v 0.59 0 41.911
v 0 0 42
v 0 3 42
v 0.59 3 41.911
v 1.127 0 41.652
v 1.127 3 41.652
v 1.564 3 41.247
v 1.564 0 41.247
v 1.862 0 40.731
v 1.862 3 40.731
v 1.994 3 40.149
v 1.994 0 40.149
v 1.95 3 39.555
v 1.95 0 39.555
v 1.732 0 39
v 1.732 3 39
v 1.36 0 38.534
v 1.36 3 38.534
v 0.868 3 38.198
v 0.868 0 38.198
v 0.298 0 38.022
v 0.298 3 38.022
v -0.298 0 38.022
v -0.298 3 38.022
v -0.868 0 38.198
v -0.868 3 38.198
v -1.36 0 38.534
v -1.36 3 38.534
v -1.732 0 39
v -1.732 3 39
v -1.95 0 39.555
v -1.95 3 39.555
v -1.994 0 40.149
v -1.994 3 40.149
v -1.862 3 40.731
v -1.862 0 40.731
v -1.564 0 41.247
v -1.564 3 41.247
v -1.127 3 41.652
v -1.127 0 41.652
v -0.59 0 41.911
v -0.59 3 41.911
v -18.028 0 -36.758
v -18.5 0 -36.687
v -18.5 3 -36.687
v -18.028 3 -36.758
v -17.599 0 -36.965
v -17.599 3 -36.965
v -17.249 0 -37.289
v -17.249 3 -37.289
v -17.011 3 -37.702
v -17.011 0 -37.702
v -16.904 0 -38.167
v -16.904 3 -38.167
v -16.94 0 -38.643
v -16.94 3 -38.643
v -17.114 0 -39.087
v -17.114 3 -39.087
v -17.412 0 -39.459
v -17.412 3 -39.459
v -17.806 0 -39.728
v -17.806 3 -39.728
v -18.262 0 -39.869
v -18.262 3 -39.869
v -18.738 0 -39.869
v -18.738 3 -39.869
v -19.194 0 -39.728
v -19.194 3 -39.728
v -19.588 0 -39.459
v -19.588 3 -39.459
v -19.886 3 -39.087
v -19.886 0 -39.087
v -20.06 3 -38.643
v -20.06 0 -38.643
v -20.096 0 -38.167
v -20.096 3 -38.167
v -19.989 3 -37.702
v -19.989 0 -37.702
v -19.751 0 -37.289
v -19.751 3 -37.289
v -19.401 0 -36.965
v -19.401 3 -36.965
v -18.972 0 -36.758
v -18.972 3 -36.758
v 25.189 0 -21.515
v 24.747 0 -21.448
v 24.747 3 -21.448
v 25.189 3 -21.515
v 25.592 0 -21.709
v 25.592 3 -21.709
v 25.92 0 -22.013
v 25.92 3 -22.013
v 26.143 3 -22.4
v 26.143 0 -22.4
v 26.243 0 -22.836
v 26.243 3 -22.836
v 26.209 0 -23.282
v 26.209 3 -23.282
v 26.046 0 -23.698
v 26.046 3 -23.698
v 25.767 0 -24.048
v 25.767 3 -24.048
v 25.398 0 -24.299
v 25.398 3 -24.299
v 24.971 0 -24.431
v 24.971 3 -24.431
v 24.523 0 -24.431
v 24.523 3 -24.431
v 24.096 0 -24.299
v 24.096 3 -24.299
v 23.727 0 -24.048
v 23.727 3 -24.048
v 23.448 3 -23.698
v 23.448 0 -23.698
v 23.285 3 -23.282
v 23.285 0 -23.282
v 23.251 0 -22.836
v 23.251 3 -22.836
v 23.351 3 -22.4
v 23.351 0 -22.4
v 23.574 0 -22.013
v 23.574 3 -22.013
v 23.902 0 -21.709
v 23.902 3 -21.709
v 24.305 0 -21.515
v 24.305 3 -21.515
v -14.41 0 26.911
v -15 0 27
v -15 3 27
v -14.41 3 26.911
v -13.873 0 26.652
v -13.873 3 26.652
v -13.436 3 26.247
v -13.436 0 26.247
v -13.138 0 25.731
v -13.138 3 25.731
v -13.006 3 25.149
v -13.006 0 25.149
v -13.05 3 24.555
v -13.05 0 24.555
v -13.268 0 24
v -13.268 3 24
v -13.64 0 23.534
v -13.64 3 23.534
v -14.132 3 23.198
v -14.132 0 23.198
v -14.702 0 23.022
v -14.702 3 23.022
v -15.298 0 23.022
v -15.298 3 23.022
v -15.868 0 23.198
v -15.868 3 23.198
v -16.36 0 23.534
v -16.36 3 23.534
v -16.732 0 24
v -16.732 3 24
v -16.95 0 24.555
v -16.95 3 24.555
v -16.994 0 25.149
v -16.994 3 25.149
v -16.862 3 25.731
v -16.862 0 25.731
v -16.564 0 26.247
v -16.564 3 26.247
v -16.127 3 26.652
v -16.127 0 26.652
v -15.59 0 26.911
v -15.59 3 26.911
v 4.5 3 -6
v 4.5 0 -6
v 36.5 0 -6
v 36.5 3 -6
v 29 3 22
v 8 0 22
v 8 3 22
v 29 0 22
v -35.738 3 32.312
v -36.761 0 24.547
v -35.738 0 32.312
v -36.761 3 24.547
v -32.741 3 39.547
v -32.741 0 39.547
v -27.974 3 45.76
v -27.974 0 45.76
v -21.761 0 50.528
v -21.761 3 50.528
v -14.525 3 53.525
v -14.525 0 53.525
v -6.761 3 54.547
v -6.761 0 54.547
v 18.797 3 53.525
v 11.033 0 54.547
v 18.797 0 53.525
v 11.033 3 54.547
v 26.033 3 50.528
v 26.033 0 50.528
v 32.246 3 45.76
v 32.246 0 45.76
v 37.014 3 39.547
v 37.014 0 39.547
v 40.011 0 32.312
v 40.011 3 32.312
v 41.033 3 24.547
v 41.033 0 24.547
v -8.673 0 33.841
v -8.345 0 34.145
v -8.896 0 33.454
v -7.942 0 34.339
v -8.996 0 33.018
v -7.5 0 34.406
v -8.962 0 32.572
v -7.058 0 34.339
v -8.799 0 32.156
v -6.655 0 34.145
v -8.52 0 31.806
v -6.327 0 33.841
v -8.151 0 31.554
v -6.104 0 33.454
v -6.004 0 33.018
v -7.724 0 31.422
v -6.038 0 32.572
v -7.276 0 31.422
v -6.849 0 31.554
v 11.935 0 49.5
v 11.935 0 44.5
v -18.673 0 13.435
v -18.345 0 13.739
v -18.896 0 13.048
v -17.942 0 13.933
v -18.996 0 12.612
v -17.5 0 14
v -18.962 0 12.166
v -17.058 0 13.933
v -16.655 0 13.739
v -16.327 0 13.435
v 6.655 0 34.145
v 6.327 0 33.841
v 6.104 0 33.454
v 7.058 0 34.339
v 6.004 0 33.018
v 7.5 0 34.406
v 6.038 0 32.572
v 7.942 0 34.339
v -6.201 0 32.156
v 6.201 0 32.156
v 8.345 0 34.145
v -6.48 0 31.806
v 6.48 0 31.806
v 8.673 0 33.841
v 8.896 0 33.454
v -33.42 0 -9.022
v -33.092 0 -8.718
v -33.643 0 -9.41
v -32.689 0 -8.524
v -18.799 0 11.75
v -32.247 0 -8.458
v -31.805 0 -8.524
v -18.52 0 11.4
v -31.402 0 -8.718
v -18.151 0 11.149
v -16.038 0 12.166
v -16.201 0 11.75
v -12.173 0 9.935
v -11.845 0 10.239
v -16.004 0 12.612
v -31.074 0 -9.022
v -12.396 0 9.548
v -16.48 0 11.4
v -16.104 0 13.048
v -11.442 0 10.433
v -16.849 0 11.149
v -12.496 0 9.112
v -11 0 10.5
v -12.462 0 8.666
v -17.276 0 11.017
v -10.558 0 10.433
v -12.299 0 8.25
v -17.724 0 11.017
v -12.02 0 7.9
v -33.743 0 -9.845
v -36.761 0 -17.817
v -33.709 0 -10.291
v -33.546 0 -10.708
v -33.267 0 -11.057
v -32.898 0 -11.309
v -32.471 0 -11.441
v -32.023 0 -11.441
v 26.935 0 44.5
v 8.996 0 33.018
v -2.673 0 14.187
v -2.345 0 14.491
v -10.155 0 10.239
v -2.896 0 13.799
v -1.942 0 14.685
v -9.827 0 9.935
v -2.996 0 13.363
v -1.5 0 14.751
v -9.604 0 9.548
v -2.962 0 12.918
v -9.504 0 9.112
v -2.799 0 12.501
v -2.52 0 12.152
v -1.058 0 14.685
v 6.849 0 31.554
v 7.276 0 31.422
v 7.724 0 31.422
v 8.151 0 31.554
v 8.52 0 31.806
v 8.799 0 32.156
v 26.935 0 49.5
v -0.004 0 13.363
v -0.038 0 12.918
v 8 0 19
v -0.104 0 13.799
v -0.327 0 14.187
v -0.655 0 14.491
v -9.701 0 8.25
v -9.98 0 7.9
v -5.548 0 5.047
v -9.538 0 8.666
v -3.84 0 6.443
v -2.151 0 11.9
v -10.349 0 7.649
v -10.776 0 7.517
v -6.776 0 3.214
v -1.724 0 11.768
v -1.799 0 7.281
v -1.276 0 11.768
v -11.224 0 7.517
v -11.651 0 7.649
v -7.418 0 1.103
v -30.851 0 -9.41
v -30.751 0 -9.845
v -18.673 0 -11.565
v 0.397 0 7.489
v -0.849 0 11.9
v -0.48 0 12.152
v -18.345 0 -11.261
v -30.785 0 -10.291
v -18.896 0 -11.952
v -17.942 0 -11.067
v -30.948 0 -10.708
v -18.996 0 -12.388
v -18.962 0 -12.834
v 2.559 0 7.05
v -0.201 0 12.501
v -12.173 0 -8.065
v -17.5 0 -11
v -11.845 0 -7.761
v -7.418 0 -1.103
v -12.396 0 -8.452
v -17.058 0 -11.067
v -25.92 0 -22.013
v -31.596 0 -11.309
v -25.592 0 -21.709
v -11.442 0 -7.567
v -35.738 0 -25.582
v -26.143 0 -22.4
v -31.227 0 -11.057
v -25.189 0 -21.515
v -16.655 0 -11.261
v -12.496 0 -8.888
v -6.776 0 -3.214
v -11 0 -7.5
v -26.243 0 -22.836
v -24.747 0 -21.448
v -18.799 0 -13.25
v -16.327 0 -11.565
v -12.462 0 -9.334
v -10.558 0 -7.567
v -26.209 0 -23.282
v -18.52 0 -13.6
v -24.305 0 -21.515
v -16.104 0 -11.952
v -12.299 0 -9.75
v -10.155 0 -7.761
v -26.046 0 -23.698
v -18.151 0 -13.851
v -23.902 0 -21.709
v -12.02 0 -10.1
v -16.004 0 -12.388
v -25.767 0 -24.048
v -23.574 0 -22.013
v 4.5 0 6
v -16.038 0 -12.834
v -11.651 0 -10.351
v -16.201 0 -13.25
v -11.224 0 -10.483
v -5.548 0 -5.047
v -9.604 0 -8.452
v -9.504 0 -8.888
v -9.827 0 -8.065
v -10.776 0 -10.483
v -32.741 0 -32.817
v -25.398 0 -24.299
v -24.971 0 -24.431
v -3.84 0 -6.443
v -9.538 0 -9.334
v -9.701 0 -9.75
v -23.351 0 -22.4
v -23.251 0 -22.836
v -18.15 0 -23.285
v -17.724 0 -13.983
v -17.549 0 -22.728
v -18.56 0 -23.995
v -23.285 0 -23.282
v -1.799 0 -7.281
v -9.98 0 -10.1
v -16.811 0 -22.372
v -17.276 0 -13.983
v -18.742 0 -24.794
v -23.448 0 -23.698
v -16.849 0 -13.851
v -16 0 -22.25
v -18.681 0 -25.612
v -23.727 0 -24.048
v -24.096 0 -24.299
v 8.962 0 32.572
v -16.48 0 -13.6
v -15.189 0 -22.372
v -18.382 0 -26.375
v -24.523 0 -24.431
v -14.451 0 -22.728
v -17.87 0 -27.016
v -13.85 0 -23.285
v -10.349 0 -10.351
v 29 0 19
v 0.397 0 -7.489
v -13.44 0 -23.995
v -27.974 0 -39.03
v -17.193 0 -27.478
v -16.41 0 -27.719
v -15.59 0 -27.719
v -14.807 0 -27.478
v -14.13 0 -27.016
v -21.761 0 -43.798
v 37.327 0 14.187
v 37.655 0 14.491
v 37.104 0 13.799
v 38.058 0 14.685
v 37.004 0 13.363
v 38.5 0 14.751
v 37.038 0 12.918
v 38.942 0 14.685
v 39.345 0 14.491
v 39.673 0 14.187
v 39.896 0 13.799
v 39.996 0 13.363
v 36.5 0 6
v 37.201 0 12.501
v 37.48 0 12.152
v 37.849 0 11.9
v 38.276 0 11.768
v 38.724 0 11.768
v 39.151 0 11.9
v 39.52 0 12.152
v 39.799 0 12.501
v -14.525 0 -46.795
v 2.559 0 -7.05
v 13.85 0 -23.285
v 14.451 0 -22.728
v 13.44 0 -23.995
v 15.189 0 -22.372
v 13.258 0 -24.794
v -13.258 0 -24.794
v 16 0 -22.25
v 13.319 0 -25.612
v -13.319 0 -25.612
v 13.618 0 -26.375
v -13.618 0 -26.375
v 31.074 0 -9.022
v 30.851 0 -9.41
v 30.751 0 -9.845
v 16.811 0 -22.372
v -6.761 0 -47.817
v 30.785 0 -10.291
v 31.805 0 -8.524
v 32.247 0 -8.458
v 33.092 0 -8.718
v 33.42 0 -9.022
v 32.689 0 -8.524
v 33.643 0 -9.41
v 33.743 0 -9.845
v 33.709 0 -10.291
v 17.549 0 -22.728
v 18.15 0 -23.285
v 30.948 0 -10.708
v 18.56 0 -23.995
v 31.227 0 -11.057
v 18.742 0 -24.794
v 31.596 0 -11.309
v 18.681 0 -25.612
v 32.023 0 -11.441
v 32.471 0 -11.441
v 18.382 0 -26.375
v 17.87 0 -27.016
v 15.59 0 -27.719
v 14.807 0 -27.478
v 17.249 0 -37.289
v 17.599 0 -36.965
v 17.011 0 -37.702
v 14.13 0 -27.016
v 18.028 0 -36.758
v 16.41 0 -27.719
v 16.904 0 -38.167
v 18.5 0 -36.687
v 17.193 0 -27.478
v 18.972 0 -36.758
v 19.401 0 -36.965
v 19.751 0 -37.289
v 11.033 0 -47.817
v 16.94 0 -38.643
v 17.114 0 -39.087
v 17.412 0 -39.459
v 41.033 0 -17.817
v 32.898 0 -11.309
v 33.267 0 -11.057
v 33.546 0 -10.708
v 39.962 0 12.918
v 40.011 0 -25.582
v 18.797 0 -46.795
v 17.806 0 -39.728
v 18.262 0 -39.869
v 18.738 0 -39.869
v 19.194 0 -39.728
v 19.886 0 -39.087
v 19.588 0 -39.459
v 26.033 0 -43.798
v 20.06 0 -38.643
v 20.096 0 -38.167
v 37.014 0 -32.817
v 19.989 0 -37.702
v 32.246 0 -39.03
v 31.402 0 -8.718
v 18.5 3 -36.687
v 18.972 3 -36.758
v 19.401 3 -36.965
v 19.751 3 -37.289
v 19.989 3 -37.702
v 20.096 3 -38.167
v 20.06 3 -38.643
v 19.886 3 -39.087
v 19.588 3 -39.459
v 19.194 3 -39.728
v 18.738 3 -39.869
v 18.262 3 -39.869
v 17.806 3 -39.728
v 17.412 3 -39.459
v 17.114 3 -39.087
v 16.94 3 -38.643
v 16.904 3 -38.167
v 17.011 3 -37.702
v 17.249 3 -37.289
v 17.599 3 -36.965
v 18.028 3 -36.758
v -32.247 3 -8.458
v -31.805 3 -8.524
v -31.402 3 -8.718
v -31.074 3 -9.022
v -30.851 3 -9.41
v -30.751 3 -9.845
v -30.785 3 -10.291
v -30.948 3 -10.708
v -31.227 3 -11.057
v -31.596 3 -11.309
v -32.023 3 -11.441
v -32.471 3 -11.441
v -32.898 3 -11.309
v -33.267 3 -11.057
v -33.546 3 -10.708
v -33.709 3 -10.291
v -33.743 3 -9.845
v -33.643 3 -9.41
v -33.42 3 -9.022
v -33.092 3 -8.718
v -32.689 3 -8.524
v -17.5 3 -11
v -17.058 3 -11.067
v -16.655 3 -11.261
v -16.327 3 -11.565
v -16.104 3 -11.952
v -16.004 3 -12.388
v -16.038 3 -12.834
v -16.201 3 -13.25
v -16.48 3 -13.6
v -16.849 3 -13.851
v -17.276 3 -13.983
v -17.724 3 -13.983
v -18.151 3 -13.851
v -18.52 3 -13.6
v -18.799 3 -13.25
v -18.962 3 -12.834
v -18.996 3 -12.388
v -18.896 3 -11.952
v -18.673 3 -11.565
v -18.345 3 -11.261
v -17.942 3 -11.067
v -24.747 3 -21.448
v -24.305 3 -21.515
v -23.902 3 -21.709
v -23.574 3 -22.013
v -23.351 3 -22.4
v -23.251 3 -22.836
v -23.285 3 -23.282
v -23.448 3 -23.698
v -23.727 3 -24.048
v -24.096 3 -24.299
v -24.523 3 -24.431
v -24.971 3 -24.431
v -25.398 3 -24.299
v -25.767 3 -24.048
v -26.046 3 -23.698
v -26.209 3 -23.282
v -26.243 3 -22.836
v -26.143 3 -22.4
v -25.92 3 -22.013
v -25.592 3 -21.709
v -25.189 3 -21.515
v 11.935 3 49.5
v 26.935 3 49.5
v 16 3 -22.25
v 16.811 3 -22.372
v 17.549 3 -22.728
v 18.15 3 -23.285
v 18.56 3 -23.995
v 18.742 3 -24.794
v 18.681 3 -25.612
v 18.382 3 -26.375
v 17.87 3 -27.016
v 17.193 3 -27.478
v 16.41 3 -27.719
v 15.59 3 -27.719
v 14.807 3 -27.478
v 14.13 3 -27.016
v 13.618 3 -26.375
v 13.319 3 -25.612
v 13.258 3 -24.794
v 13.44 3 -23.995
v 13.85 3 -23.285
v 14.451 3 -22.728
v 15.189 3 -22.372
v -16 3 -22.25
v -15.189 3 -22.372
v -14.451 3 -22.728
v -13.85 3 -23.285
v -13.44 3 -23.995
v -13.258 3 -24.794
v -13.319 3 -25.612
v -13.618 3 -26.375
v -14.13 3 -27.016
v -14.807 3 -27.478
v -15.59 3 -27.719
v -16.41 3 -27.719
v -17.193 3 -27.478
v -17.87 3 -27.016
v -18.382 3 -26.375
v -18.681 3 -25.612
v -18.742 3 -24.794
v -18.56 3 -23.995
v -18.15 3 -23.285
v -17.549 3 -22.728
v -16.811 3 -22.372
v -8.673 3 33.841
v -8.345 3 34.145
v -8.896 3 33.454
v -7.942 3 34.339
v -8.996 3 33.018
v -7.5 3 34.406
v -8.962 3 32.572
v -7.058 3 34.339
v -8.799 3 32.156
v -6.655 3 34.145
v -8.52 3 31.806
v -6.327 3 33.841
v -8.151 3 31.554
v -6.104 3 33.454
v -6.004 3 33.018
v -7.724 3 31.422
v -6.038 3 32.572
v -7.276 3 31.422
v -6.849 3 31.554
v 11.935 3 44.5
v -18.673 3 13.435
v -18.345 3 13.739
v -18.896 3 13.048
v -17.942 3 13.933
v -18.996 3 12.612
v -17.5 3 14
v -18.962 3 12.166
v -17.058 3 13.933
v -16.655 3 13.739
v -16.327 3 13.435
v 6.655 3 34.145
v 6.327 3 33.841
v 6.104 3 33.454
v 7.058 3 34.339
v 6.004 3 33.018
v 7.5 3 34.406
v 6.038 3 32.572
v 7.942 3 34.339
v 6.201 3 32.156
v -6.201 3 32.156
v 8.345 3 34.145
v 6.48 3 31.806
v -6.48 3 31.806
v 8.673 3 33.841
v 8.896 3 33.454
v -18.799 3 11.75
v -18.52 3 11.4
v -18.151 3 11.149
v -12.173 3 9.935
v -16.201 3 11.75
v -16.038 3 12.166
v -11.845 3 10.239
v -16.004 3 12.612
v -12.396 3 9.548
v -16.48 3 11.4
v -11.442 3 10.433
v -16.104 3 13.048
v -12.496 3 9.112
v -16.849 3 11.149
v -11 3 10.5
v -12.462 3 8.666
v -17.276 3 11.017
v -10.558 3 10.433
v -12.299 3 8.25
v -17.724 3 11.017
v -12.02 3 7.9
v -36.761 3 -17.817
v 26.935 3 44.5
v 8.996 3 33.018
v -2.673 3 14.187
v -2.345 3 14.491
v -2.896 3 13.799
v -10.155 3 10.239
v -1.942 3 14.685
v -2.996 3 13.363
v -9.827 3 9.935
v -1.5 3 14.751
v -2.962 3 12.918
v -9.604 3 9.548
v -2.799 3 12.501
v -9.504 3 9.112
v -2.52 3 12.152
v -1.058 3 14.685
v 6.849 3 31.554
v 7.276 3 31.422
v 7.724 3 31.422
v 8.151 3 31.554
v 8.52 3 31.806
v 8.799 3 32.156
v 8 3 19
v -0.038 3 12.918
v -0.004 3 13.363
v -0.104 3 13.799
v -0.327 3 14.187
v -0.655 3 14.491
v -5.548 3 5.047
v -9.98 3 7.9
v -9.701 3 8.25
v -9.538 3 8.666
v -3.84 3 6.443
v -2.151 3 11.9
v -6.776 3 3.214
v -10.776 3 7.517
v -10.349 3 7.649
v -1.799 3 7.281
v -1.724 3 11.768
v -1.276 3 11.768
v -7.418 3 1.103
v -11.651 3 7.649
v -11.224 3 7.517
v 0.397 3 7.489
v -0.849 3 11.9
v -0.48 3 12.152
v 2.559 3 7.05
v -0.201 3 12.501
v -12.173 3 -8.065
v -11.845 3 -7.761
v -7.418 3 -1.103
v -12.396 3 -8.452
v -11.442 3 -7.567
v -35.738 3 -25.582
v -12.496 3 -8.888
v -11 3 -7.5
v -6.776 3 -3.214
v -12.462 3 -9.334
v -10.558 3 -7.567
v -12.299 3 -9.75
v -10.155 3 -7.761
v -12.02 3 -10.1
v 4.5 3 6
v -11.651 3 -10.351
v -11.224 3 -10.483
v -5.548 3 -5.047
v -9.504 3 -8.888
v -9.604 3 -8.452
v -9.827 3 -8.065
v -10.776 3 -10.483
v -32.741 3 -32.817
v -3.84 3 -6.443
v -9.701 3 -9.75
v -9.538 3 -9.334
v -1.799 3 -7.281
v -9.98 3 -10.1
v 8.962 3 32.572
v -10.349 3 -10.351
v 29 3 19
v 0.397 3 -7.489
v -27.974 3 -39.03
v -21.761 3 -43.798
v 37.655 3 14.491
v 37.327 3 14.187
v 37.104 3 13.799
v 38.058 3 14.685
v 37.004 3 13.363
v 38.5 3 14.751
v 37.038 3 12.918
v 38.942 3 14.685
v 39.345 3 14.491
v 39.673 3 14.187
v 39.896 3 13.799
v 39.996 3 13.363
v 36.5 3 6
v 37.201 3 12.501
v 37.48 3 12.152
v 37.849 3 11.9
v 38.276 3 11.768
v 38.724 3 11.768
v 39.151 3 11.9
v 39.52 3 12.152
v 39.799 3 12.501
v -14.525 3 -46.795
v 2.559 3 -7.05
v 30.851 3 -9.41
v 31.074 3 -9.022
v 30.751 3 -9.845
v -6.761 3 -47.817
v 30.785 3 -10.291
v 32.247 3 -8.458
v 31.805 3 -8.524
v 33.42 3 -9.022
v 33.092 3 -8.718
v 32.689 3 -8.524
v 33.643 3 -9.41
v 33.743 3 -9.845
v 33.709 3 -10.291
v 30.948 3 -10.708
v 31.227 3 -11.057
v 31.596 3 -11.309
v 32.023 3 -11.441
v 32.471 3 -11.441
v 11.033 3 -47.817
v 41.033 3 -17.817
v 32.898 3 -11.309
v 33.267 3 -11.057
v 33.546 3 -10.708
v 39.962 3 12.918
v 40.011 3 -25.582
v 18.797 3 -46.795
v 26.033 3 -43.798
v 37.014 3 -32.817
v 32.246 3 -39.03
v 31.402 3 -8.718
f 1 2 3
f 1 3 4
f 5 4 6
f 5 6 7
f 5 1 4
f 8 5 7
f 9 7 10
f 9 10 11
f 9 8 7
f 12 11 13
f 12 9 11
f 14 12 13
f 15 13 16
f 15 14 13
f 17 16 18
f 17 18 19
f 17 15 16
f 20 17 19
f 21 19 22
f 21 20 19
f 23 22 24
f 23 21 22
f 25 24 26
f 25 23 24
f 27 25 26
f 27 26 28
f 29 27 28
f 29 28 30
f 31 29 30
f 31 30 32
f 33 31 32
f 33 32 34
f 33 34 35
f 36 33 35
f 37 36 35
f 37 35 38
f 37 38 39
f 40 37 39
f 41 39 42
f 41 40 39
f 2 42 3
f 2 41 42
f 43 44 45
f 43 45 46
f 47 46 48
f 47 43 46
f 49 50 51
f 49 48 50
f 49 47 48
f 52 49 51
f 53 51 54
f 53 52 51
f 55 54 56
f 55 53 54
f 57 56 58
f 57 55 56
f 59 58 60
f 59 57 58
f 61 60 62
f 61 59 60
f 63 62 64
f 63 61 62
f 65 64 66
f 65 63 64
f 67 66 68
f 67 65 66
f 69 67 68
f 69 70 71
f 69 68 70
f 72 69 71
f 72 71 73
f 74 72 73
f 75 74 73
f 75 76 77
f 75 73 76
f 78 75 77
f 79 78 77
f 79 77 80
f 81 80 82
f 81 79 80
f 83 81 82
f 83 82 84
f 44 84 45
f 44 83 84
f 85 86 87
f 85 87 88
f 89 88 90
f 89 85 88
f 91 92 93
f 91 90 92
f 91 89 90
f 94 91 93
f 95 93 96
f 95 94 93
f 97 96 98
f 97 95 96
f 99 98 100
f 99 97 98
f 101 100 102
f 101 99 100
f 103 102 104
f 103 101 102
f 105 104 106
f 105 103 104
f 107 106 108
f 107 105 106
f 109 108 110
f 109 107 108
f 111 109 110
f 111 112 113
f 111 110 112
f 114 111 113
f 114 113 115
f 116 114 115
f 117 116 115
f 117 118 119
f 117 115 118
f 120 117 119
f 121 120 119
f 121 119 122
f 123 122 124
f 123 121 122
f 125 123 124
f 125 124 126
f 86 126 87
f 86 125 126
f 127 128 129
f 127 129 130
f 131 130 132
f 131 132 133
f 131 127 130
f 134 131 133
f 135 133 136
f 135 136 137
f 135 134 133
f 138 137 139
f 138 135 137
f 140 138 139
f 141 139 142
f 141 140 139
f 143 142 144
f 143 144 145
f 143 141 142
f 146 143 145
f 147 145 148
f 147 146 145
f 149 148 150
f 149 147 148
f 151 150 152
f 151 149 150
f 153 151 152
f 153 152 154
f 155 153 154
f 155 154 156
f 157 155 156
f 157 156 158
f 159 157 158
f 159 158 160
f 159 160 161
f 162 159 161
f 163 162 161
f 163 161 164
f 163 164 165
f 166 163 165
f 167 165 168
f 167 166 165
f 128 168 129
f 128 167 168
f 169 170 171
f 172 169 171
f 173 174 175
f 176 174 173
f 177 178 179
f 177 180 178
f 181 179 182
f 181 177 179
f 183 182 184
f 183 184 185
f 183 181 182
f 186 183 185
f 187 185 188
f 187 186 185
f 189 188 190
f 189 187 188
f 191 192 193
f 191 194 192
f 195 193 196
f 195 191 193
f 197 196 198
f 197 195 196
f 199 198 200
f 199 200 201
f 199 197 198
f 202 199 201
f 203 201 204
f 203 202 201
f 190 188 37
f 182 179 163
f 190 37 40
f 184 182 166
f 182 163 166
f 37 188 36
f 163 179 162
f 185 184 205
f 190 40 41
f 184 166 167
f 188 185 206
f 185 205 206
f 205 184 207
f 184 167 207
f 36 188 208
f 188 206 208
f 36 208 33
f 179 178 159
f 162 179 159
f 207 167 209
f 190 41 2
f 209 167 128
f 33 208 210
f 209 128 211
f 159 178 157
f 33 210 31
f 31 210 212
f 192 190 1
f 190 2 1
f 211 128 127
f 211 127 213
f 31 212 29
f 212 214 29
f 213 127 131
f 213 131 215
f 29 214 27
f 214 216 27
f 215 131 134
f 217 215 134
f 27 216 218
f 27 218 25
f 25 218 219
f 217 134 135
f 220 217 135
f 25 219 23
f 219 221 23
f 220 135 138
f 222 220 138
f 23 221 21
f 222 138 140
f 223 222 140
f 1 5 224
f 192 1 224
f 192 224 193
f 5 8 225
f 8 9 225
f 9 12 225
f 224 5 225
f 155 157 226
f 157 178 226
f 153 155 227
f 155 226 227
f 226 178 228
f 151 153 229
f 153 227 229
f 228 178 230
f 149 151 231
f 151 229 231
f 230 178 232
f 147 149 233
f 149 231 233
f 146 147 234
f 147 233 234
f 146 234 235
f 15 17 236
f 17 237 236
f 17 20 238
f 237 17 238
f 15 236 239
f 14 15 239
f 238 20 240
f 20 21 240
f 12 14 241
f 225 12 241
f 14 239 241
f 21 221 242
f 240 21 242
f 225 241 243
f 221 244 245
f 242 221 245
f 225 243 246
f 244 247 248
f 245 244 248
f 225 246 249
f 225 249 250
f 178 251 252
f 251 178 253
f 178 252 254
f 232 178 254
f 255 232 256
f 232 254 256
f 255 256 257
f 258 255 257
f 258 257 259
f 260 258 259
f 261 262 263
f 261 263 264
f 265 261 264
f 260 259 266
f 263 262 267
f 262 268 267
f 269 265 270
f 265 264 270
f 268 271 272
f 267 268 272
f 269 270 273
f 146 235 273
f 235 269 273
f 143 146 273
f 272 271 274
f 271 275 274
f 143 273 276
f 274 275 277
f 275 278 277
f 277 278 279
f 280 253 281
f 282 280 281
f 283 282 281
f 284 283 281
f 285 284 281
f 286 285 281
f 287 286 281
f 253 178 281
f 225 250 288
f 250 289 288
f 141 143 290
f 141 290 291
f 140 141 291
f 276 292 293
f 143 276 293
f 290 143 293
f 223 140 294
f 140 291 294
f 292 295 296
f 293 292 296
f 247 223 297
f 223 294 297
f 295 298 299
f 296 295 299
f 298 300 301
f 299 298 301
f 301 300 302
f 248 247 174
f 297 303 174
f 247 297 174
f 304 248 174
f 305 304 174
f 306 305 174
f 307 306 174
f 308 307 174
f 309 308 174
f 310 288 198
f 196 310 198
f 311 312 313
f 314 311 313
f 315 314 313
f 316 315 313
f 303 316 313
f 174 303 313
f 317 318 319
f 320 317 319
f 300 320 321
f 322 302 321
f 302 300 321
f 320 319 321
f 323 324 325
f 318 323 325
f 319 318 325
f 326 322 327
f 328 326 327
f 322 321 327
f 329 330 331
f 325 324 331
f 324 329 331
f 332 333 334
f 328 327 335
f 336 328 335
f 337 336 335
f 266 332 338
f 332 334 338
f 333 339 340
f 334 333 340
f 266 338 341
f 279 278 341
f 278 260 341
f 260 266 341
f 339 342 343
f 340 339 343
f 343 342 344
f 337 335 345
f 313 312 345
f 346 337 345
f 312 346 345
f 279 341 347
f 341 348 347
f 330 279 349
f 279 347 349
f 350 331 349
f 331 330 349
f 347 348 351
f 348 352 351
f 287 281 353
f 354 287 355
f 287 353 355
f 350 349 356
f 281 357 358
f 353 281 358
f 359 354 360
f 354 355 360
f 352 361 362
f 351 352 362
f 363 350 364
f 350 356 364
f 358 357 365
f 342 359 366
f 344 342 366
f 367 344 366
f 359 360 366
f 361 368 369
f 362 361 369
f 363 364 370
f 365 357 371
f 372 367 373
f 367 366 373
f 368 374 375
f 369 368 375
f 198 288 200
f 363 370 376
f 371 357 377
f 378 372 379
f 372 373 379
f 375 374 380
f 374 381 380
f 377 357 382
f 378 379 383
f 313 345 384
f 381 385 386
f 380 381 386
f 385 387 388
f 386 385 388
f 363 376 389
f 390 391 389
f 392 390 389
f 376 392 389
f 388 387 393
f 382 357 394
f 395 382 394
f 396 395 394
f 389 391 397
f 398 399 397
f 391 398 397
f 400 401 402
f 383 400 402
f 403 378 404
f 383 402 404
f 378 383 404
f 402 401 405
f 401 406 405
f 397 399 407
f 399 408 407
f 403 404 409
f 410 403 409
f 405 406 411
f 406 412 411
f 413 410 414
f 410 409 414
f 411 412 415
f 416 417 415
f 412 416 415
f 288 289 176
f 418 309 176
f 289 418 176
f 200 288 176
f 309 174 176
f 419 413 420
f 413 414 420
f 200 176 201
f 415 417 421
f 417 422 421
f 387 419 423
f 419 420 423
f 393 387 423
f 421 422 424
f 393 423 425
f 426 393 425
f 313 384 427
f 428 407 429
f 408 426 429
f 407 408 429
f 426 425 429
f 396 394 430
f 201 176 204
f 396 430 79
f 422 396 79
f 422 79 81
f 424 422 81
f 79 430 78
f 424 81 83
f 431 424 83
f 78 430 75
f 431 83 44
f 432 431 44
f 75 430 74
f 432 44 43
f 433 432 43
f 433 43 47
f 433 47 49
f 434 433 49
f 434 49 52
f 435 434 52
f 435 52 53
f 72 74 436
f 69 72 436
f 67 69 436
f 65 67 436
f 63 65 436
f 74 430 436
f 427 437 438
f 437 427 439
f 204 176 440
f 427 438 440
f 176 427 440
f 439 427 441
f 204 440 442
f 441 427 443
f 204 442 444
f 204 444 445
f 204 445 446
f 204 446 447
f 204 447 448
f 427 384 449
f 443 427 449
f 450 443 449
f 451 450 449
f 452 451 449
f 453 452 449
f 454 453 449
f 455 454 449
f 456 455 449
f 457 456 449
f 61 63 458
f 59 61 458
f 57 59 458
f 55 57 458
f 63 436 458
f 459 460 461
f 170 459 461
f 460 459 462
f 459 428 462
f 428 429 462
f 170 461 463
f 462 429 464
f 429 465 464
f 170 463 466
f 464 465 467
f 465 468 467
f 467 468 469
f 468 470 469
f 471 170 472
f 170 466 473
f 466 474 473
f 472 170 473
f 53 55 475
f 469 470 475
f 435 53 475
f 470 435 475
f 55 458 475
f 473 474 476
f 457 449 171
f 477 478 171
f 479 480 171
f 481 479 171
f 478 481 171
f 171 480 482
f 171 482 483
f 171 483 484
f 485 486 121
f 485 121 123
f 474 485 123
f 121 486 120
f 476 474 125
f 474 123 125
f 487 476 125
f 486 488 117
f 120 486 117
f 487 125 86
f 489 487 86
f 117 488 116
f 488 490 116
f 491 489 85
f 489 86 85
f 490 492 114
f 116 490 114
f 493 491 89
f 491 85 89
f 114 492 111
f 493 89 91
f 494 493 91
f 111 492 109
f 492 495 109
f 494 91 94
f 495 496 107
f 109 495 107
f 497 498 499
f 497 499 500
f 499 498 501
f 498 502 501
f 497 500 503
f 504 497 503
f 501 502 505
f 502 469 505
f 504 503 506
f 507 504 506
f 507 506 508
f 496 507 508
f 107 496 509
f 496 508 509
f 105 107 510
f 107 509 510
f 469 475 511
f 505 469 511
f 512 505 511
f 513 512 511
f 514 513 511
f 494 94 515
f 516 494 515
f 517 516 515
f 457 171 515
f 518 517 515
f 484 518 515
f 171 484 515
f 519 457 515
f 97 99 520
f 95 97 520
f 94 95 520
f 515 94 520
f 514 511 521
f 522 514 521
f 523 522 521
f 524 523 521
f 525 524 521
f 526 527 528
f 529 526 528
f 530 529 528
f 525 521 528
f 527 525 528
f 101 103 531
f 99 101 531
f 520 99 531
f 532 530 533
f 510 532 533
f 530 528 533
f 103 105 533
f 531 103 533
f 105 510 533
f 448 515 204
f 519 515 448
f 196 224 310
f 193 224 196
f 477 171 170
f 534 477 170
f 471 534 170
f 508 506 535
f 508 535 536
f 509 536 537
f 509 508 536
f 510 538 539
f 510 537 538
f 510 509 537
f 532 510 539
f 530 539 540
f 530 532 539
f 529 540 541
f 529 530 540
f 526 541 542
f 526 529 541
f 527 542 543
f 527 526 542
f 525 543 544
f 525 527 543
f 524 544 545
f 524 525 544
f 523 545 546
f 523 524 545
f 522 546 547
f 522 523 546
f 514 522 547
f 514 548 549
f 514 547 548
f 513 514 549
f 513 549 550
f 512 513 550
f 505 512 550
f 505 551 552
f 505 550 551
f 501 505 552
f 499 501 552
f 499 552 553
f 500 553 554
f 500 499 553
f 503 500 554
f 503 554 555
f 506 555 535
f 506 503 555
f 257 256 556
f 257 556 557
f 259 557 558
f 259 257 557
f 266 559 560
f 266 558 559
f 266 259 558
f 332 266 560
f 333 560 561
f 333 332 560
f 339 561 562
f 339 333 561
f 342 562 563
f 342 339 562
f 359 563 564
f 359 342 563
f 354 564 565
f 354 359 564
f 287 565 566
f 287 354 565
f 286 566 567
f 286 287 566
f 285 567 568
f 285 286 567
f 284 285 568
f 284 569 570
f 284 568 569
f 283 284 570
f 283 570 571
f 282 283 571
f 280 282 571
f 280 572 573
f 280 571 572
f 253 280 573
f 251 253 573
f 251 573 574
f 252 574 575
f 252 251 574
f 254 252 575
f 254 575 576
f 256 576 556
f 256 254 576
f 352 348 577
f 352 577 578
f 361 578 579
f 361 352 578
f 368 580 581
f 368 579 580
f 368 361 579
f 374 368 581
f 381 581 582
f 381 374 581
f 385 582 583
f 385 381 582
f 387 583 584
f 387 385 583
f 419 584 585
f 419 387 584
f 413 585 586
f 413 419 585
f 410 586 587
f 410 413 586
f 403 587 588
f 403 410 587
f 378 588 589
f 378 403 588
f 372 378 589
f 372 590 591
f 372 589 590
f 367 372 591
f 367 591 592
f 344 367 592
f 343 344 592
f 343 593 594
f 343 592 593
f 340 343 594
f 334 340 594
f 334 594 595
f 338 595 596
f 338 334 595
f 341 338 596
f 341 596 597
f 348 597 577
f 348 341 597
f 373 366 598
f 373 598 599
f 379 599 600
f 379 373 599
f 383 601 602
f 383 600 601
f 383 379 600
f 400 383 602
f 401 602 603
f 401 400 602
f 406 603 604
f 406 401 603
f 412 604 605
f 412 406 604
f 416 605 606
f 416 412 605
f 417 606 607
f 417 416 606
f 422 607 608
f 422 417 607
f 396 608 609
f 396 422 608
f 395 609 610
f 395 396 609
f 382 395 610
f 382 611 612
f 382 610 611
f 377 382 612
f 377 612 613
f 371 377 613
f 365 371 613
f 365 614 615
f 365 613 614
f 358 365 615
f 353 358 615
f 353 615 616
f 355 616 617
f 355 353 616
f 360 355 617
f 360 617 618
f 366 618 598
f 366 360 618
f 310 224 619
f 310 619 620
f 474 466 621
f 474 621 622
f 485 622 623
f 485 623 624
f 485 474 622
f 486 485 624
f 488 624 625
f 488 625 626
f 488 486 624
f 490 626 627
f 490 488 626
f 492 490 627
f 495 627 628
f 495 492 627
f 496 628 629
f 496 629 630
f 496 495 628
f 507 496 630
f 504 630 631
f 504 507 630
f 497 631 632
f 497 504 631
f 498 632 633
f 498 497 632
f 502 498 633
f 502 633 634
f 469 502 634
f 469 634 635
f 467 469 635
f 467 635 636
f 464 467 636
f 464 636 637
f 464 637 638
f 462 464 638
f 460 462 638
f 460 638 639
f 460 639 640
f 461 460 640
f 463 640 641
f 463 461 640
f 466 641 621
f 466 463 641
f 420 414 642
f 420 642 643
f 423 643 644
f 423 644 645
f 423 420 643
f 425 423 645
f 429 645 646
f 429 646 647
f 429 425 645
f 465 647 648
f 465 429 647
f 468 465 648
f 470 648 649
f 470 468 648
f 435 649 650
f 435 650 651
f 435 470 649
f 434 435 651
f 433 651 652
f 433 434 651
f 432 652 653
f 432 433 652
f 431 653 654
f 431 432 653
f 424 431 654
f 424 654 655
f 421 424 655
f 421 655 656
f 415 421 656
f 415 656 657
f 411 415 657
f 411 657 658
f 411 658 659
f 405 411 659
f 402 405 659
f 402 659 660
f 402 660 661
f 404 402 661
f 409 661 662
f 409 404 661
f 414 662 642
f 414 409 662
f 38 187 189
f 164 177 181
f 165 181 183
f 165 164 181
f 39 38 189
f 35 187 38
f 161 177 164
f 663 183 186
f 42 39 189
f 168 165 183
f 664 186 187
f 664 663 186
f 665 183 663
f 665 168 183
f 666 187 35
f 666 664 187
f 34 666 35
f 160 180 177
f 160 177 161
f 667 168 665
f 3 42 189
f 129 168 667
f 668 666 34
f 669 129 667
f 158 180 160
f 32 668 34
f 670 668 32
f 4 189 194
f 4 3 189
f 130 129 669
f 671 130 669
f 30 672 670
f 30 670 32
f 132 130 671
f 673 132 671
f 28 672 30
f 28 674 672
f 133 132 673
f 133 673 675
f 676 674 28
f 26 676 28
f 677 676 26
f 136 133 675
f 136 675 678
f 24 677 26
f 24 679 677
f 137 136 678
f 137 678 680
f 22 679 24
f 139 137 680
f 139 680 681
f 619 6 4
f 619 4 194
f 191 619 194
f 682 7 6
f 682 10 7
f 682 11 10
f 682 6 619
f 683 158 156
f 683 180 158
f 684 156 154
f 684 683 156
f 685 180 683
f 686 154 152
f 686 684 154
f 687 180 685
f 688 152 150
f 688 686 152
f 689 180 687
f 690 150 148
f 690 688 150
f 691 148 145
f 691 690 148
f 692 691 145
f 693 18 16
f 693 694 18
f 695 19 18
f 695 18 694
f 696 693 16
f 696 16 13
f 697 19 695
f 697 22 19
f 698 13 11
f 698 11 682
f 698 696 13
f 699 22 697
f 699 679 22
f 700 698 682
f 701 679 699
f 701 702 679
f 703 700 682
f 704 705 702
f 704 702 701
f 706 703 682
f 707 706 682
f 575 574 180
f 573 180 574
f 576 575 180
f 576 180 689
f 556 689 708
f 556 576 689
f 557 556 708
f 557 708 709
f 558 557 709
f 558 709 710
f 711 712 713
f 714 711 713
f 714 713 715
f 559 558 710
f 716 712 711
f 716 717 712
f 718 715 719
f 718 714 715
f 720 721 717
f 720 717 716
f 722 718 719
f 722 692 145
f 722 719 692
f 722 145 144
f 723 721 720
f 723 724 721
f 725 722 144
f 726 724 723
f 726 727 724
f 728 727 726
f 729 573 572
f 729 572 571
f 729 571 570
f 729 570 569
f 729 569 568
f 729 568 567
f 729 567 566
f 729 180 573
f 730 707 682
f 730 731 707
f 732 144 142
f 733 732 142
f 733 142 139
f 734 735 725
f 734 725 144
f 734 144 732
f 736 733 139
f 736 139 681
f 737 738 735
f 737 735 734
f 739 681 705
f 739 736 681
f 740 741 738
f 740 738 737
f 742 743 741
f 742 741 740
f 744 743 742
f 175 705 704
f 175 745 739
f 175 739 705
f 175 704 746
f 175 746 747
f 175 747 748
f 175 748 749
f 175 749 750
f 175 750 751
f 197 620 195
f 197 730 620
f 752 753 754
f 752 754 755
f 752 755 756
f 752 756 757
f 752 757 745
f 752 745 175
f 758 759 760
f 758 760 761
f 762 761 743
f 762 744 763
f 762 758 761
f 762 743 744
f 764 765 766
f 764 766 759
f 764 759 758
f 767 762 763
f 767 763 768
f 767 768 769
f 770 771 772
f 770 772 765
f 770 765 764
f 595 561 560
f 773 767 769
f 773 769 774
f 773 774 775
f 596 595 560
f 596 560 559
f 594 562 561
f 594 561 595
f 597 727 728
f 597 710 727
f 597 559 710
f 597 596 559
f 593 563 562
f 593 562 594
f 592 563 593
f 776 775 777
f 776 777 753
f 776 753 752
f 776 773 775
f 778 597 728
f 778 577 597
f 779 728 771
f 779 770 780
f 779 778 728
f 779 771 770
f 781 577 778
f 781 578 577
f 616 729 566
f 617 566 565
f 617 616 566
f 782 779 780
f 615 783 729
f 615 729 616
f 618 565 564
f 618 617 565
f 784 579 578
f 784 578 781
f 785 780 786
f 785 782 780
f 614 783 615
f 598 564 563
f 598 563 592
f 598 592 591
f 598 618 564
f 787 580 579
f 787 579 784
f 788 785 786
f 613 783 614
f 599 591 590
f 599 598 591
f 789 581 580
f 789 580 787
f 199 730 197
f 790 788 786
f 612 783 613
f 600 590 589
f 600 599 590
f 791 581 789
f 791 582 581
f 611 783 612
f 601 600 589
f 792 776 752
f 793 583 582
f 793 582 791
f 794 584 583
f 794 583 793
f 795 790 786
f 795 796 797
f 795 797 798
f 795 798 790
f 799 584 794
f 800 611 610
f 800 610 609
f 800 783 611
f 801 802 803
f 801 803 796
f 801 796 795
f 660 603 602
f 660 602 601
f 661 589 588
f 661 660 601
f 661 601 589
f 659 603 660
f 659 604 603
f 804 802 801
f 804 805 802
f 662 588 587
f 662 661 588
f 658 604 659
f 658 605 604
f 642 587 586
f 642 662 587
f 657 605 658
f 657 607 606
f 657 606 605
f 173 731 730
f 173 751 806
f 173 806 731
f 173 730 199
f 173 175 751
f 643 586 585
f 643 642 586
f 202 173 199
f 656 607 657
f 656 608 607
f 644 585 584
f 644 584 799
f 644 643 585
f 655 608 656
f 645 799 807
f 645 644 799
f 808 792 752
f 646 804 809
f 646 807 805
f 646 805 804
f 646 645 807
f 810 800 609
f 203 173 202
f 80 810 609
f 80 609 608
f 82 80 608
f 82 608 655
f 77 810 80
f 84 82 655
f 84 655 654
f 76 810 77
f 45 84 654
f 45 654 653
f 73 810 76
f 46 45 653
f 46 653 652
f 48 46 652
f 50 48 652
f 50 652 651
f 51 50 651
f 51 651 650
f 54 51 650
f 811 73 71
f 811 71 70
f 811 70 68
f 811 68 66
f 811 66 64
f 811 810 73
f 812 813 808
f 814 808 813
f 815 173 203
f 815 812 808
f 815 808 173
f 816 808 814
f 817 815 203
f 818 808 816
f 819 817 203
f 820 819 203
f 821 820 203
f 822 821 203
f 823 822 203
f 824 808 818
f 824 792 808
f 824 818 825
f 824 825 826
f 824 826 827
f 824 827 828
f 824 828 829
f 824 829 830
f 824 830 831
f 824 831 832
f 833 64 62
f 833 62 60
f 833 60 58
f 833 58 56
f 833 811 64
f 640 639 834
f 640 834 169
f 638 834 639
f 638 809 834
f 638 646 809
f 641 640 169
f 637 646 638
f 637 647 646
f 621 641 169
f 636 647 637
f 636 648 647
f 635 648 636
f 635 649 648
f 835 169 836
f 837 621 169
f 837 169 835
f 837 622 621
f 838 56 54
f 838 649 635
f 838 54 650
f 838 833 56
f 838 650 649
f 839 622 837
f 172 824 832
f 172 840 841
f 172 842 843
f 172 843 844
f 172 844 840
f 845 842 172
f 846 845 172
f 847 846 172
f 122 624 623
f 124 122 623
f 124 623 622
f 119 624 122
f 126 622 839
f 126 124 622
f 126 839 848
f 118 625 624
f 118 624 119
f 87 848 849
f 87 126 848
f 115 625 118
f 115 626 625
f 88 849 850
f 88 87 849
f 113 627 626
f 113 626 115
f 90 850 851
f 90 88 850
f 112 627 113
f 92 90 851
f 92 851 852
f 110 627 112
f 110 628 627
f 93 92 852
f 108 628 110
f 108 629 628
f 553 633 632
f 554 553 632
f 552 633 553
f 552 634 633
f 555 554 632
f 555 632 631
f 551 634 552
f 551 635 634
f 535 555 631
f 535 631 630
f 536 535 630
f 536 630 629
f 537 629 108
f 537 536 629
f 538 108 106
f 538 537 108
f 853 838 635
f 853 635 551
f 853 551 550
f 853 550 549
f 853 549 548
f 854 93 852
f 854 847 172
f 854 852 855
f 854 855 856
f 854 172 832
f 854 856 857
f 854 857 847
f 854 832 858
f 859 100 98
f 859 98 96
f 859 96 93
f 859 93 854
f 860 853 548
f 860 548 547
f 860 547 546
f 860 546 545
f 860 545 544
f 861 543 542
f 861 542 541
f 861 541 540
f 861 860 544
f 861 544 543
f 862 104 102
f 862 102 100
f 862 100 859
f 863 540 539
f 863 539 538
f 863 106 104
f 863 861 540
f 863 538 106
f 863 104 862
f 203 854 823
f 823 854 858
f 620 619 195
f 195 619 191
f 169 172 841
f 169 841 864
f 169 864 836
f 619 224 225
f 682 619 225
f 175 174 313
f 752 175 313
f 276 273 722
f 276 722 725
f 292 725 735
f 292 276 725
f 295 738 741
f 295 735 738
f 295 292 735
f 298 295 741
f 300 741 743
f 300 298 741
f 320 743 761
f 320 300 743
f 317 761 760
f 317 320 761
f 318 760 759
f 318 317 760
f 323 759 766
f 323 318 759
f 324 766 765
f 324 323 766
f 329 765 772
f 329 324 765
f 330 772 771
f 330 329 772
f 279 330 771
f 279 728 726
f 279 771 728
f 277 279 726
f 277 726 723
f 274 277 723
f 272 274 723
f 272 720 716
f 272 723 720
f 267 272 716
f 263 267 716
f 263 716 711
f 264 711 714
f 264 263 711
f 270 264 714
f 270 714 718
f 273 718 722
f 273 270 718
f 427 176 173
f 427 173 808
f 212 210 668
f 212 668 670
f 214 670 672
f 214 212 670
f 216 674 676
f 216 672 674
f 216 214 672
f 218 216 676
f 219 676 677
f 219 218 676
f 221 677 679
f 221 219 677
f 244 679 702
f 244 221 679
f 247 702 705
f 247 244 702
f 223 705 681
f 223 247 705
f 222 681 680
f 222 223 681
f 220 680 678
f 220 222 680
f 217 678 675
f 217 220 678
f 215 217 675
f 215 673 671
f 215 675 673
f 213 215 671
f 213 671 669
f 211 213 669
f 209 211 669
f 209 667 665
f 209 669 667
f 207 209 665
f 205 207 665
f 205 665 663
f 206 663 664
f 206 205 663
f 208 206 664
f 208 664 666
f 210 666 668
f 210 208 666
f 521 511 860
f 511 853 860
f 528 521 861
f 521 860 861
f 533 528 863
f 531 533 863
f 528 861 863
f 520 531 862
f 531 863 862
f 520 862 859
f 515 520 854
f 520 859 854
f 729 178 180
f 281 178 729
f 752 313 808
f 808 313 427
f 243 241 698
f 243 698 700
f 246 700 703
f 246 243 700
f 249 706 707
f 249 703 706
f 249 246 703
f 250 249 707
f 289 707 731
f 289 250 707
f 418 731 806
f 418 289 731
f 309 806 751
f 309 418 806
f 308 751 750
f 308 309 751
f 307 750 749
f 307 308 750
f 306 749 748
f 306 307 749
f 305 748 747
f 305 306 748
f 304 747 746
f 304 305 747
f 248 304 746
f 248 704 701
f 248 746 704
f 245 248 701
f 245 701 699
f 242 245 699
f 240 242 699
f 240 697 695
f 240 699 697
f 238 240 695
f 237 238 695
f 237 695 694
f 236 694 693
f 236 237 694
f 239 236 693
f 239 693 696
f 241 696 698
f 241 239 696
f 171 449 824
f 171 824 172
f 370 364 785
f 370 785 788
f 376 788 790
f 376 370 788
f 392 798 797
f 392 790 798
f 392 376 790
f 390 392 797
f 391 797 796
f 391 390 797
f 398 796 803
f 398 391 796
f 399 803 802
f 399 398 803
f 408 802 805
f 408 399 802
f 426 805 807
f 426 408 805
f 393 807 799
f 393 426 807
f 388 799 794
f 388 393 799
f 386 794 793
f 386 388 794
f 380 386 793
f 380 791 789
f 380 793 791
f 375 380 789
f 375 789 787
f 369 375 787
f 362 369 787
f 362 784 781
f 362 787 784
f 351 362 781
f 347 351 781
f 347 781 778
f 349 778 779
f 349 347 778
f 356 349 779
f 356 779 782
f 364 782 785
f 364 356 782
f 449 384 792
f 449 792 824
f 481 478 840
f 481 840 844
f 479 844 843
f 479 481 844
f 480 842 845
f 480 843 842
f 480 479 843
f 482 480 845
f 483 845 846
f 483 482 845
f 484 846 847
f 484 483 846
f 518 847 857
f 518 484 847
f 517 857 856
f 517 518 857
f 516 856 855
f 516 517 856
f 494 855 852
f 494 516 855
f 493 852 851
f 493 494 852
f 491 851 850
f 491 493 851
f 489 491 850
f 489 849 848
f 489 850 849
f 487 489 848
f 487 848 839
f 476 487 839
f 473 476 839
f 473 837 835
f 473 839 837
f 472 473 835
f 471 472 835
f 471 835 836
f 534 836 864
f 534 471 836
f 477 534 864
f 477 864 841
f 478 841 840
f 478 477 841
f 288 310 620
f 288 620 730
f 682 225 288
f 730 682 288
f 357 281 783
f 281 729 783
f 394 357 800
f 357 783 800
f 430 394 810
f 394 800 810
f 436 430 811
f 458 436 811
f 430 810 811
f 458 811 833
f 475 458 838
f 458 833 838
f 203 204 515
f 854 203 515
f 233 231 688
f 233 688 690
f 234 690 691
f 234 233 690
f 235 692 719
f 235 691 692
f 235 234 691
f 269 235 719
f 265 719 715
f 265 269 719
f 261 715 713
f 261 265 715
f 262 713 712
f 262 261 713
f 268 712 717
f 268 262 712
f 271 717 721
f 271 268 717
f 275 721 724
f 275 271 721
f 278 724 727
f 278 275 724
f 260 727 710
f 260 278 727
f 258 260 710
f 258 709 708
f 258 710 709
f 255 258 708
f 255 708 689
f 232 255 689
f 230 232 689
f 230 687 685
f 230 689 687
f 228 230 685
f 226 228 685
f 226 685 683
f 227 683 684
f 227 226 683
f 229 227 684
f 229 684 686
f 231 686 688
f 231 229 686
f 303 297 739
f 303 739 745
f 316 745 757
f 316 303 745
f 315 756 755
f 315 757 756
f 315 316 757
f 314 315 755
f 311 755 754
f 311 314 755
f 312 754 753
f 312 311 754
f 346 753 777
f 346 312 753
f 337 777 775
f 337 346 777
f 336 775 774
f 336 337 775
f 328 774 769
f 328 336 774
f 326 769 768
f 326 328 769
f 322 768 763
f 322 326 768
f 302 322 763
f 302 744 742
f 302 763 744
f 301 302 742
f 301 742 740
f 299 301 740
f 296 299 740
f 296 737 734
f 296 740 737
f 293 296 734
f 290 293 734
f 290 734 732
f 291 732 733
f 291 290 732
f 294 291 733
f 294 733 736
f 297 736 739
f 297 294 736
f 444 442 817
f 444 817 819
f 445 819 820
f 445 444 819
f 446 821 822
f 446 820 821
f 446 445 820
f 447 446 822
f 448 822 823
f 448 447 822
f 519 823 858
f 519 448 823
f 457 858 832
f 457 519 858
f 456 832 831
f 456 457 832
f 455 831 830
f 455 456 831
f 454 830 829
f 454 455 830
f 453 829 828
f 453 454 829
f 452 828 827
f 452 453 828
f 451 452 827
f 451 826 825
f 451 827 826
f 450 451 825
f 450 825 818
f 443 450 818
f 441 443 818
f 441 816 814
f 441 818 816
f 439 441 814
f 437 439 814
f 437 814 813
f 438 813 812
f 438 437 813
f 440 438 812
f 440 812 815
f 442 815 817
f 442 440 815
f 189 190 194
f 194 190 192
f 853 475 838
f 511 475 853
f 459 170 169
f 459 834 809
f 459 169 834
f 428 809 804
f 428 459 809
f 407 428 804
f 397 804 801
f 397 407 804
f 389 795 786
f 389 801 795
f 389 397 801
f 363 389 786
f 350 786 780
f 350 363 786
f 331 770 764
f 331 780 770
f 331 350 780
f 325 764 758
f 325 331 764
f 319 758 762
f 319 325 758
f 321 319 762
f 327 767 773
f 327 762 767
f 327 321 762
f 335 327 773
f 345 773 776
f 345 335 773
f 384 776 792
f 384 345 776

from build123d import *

# Parameters (mm, degrees)
SKETCH1_W               = 77.793311879
SKETCH1_H               = 102.364407774
SKETCH1_R               = 2.75
SKETCH1_R_2             = 2
SKETCH1_R_3             = 7.5
BOSS_EXTRUDE1_DEPTH     = 3
CUT_EXTRUDE1_DEPTH      = 69.323346558
CUT_EXTRUDE1_DEPTH_BACK = 69.323346558
SKETCH2_R               = 1.5
CUT_EXTRUDE2_DEPTH      = 69.323346558
CUT_EXTRUDE2_DEPTH_BACK = 69.323346558
SKETCH3_W               = 36
SKETCH3_H               = 12
SKETCH3_W_2             = 21
SKETCH3_H_2             = 3
SKETCH3_W_3             = 15
SKETCH3_H_3             = 5
SKETCH3_R               = 1.5
CUT_EXTRUDE3_DEPTH      = 69.323346558
CUT_EXTRUDE3_DEPTH_BACK = 69.323346558
SKETCH4_R               = 1.5
CUT_EXTRUDE4_DEPTH      = 69.323346558
CUT_EXTRUDE4_DEPTH_BACK = 69.323346558
SKETCH5_R               = 1.6
FILLET1_R               = 30
CUT_EXTRUDE5_DEPTH      = 69.323346558
CUT_EXTRUDE5_DEPTH_BACK = 69.323346558
SKETCH6_R               = 1.5


with BuildPart() as part:
    # Sketch1 → Boss-Extrude1 (new body)
    with BuildSketch(Plane(origin=(0, 0, 0), x_dir=(1, 0, 0), z_dir=(0, 1, 0))):
        with Locations((2.136088924, -3.364964086)):
            Rectangle(SKETCH1_W, SKETCH1_H)
        with Locations(Location((-16, 25, 0), (0, 0, 270))):
            Circle(SKETCH1_R, mode=Mode.SUBTRACT)
        with Locations(Location((16, 25, 0), (0, 0, 270))):
            Circle(SKETCH1_R, mode=Mode.SUBTRACT)
        with Locations(Location((-15, -25, 0), (0, 0, 270))):
            Circle(SKETCH1_R_2, mode=Mode.SUBTRACT)
        with Locations(Location((0, 0, 0), (0, 0, 270))):
            Circle(SKETCH1_R_3, mode=Mode.SUBTRACT)
        with Locations(Location((0, -40, 0), (0, 0, 270))):
            Circle(SKETCH1_R_2, mode=Mode.SUBTRACT)
    extrude(amount=BOSS_EXTRUDE1_DEPTH)

    # Sketch2 → Cut-Extrude1 (cut, two sides: drawn at the far end of the back side and taken through both)
    with BuildSketch(Plane(origin=(0, 3, 0), x_dir=(1, 0, 0), z_dir=(0, 1, 0)).offset(-CUT_EXTRUDE1_DEPTH_BACK)):
        with Locations(Location((7.5, -32.905563019, 0), (0, 0, 270))):
            Circle(SKETCH2_R)
        with Locations(Location((-7.5, -32.905563019, 0), (0, 0, 270))):
            Circle(SKETCH2_R)
        with Locations(Location((-32.2470535, 9.957590981, 0), (0, 0, 270))):
            Circle(SKETCH2_R)
        with Locations(Location((-24.7470535, 22.947972038, 0), (0, 0, 270))):
            Circle(SKETCH2_R)
        with Locations(Location((24.7470535, 22.947972038, 0), (0, 0, 270))):
            Circle(SKETCH2_R)
        with Locations(Location((32.2470535, 9.957590981, 0), (0, 0, 270))):
            Circle(SKETCH2_R)
    extrude(amount=CUT_EXTRUDE1_DEPTH + CUT_EXTRUDE1_DEPTH_BACK, mode=Mode.SUBTRACT)

    # Sketch3 → Cut-Extrude2 (cut, two sides: drawn at the far end of the back side and taken through both)
    with BuildSketch(Plane(origin=(0, 3, 0), x_dir=(1, 0, 0), z_dir=(0, 1, 0)).offset(-CUT_EXTRUDE2_DEPTH_BACK)):
        with Locations((18.5, 0)):
            Rectangle(SKETCH3_W, SKETCH3_H)
        with Locations((18.5, -20.5)):
            Rectangle(SKETCH3_W_2, SKETCH3_H_2)
        with Locations((19.434564823, -47)):
            Rectangle(SKETCH3_W_3, SKETCH3_H_3)
        with Locations(Location((38.5, -13.251338354, 0), (0, 0, 270))):
            Circle(SKETCH3_R)
        with Locations(Location((-1.5, -13.251338354, 0), (0, 0, 270))):
            Circle(SKETCH3_R)
    extrude(amount=CUT_EXTRUDE2_DEPTH + CUT_EXTRUDE2_DEPTH_BACK, mode=Mode.SUBTRACT)

    # Sketch4 → Cut-Extrude3 (cut, two sides: drawn at the far end of the back side and taken through both)
    with BuildSketch(Plane(origin=(0, 3, 0), x_dir=(1, 0, 0), z_dir=(0, 1, 0)).offset(-CUT_EXTRUDE3_DEPTH_BACK)):
        with Locations(Location((-11, 9, 0), (0, 0, 270))):
            Circle(SKETCH4_R)
        with Locations(Location((-11, -9, 0), (0, 0, 270))):
            Circle(SKETCH4_R)
    extrude(amount=CUT_EXTRUDE3_DEPTH + CUT_EXTRUDE3_DEPTH_BACK, mode=Mode.SUBTRACT)

    # Sketch5 → Cut-Extrude4 (cut, two sides: drawn at the far end of the back side and taken through both)
    with BuildSketch(Plane(origin=(0, 3, 0), x_dir=(1, 0, 0), z_dir=(0, 1, 0)).offset(-CUT_EXTRUDE4_DEPTH_BACK)):
        with Locations(Location((18.5, 38.28654225, 0), (0, 0, 270))):
            Circle(SKETCH5_R)
        with Locations(Location((-18.5, 38.28654225, 0), (0, 0, 270))):
            Circle(SKETCH5_R)
    extrude(amount=CUT_EXTRUDE4_DEPTH + CUT_EXTRUDE4_DEPTH_BACK, mode=Mode.SUBTRACT)

    # Fillet1
    fillet1_edges = [part.edges().sort_by_distance(p)[0] for p in [
        (-36.760567016, 1.5, -47.817239801),
        (41.032744863, 1.5, -47.817239801),
        (41.032744863, 1.5, 54.547167973),
        (-36.760567016, 1.5, 54.547167973),
    ]]
    fillet(fillet1_edges, radius=FILLET1_R)

    # Sketch6 → Cut-Extrude5 (cut, two sides: drawn at the far end of the back side and taken through both)
    with BuildSketch(Plane(origin=(0, 3, 0), x_dir=(1, 0, 0), z_dir=(0, 1, 0)).offset(-CUT_EXTRUDE5_DEPTH_BACK)):
        with Locations(Location((-17.49999993, 12.5, 0), (0, 0, 270))):
            Circle(SKETCH6_R)
        with Locations(Location((-17.49999993, -12.5, 0), (0, 0, 270))):
            Circle(SKETCH6_R)
    extrude(amount=CUT_EXTRUDE5_DEPTH + CUT_EXTRUDE5_DEPTH_BACK, mode=Mode.SUBTRACT)


solid = part.part
